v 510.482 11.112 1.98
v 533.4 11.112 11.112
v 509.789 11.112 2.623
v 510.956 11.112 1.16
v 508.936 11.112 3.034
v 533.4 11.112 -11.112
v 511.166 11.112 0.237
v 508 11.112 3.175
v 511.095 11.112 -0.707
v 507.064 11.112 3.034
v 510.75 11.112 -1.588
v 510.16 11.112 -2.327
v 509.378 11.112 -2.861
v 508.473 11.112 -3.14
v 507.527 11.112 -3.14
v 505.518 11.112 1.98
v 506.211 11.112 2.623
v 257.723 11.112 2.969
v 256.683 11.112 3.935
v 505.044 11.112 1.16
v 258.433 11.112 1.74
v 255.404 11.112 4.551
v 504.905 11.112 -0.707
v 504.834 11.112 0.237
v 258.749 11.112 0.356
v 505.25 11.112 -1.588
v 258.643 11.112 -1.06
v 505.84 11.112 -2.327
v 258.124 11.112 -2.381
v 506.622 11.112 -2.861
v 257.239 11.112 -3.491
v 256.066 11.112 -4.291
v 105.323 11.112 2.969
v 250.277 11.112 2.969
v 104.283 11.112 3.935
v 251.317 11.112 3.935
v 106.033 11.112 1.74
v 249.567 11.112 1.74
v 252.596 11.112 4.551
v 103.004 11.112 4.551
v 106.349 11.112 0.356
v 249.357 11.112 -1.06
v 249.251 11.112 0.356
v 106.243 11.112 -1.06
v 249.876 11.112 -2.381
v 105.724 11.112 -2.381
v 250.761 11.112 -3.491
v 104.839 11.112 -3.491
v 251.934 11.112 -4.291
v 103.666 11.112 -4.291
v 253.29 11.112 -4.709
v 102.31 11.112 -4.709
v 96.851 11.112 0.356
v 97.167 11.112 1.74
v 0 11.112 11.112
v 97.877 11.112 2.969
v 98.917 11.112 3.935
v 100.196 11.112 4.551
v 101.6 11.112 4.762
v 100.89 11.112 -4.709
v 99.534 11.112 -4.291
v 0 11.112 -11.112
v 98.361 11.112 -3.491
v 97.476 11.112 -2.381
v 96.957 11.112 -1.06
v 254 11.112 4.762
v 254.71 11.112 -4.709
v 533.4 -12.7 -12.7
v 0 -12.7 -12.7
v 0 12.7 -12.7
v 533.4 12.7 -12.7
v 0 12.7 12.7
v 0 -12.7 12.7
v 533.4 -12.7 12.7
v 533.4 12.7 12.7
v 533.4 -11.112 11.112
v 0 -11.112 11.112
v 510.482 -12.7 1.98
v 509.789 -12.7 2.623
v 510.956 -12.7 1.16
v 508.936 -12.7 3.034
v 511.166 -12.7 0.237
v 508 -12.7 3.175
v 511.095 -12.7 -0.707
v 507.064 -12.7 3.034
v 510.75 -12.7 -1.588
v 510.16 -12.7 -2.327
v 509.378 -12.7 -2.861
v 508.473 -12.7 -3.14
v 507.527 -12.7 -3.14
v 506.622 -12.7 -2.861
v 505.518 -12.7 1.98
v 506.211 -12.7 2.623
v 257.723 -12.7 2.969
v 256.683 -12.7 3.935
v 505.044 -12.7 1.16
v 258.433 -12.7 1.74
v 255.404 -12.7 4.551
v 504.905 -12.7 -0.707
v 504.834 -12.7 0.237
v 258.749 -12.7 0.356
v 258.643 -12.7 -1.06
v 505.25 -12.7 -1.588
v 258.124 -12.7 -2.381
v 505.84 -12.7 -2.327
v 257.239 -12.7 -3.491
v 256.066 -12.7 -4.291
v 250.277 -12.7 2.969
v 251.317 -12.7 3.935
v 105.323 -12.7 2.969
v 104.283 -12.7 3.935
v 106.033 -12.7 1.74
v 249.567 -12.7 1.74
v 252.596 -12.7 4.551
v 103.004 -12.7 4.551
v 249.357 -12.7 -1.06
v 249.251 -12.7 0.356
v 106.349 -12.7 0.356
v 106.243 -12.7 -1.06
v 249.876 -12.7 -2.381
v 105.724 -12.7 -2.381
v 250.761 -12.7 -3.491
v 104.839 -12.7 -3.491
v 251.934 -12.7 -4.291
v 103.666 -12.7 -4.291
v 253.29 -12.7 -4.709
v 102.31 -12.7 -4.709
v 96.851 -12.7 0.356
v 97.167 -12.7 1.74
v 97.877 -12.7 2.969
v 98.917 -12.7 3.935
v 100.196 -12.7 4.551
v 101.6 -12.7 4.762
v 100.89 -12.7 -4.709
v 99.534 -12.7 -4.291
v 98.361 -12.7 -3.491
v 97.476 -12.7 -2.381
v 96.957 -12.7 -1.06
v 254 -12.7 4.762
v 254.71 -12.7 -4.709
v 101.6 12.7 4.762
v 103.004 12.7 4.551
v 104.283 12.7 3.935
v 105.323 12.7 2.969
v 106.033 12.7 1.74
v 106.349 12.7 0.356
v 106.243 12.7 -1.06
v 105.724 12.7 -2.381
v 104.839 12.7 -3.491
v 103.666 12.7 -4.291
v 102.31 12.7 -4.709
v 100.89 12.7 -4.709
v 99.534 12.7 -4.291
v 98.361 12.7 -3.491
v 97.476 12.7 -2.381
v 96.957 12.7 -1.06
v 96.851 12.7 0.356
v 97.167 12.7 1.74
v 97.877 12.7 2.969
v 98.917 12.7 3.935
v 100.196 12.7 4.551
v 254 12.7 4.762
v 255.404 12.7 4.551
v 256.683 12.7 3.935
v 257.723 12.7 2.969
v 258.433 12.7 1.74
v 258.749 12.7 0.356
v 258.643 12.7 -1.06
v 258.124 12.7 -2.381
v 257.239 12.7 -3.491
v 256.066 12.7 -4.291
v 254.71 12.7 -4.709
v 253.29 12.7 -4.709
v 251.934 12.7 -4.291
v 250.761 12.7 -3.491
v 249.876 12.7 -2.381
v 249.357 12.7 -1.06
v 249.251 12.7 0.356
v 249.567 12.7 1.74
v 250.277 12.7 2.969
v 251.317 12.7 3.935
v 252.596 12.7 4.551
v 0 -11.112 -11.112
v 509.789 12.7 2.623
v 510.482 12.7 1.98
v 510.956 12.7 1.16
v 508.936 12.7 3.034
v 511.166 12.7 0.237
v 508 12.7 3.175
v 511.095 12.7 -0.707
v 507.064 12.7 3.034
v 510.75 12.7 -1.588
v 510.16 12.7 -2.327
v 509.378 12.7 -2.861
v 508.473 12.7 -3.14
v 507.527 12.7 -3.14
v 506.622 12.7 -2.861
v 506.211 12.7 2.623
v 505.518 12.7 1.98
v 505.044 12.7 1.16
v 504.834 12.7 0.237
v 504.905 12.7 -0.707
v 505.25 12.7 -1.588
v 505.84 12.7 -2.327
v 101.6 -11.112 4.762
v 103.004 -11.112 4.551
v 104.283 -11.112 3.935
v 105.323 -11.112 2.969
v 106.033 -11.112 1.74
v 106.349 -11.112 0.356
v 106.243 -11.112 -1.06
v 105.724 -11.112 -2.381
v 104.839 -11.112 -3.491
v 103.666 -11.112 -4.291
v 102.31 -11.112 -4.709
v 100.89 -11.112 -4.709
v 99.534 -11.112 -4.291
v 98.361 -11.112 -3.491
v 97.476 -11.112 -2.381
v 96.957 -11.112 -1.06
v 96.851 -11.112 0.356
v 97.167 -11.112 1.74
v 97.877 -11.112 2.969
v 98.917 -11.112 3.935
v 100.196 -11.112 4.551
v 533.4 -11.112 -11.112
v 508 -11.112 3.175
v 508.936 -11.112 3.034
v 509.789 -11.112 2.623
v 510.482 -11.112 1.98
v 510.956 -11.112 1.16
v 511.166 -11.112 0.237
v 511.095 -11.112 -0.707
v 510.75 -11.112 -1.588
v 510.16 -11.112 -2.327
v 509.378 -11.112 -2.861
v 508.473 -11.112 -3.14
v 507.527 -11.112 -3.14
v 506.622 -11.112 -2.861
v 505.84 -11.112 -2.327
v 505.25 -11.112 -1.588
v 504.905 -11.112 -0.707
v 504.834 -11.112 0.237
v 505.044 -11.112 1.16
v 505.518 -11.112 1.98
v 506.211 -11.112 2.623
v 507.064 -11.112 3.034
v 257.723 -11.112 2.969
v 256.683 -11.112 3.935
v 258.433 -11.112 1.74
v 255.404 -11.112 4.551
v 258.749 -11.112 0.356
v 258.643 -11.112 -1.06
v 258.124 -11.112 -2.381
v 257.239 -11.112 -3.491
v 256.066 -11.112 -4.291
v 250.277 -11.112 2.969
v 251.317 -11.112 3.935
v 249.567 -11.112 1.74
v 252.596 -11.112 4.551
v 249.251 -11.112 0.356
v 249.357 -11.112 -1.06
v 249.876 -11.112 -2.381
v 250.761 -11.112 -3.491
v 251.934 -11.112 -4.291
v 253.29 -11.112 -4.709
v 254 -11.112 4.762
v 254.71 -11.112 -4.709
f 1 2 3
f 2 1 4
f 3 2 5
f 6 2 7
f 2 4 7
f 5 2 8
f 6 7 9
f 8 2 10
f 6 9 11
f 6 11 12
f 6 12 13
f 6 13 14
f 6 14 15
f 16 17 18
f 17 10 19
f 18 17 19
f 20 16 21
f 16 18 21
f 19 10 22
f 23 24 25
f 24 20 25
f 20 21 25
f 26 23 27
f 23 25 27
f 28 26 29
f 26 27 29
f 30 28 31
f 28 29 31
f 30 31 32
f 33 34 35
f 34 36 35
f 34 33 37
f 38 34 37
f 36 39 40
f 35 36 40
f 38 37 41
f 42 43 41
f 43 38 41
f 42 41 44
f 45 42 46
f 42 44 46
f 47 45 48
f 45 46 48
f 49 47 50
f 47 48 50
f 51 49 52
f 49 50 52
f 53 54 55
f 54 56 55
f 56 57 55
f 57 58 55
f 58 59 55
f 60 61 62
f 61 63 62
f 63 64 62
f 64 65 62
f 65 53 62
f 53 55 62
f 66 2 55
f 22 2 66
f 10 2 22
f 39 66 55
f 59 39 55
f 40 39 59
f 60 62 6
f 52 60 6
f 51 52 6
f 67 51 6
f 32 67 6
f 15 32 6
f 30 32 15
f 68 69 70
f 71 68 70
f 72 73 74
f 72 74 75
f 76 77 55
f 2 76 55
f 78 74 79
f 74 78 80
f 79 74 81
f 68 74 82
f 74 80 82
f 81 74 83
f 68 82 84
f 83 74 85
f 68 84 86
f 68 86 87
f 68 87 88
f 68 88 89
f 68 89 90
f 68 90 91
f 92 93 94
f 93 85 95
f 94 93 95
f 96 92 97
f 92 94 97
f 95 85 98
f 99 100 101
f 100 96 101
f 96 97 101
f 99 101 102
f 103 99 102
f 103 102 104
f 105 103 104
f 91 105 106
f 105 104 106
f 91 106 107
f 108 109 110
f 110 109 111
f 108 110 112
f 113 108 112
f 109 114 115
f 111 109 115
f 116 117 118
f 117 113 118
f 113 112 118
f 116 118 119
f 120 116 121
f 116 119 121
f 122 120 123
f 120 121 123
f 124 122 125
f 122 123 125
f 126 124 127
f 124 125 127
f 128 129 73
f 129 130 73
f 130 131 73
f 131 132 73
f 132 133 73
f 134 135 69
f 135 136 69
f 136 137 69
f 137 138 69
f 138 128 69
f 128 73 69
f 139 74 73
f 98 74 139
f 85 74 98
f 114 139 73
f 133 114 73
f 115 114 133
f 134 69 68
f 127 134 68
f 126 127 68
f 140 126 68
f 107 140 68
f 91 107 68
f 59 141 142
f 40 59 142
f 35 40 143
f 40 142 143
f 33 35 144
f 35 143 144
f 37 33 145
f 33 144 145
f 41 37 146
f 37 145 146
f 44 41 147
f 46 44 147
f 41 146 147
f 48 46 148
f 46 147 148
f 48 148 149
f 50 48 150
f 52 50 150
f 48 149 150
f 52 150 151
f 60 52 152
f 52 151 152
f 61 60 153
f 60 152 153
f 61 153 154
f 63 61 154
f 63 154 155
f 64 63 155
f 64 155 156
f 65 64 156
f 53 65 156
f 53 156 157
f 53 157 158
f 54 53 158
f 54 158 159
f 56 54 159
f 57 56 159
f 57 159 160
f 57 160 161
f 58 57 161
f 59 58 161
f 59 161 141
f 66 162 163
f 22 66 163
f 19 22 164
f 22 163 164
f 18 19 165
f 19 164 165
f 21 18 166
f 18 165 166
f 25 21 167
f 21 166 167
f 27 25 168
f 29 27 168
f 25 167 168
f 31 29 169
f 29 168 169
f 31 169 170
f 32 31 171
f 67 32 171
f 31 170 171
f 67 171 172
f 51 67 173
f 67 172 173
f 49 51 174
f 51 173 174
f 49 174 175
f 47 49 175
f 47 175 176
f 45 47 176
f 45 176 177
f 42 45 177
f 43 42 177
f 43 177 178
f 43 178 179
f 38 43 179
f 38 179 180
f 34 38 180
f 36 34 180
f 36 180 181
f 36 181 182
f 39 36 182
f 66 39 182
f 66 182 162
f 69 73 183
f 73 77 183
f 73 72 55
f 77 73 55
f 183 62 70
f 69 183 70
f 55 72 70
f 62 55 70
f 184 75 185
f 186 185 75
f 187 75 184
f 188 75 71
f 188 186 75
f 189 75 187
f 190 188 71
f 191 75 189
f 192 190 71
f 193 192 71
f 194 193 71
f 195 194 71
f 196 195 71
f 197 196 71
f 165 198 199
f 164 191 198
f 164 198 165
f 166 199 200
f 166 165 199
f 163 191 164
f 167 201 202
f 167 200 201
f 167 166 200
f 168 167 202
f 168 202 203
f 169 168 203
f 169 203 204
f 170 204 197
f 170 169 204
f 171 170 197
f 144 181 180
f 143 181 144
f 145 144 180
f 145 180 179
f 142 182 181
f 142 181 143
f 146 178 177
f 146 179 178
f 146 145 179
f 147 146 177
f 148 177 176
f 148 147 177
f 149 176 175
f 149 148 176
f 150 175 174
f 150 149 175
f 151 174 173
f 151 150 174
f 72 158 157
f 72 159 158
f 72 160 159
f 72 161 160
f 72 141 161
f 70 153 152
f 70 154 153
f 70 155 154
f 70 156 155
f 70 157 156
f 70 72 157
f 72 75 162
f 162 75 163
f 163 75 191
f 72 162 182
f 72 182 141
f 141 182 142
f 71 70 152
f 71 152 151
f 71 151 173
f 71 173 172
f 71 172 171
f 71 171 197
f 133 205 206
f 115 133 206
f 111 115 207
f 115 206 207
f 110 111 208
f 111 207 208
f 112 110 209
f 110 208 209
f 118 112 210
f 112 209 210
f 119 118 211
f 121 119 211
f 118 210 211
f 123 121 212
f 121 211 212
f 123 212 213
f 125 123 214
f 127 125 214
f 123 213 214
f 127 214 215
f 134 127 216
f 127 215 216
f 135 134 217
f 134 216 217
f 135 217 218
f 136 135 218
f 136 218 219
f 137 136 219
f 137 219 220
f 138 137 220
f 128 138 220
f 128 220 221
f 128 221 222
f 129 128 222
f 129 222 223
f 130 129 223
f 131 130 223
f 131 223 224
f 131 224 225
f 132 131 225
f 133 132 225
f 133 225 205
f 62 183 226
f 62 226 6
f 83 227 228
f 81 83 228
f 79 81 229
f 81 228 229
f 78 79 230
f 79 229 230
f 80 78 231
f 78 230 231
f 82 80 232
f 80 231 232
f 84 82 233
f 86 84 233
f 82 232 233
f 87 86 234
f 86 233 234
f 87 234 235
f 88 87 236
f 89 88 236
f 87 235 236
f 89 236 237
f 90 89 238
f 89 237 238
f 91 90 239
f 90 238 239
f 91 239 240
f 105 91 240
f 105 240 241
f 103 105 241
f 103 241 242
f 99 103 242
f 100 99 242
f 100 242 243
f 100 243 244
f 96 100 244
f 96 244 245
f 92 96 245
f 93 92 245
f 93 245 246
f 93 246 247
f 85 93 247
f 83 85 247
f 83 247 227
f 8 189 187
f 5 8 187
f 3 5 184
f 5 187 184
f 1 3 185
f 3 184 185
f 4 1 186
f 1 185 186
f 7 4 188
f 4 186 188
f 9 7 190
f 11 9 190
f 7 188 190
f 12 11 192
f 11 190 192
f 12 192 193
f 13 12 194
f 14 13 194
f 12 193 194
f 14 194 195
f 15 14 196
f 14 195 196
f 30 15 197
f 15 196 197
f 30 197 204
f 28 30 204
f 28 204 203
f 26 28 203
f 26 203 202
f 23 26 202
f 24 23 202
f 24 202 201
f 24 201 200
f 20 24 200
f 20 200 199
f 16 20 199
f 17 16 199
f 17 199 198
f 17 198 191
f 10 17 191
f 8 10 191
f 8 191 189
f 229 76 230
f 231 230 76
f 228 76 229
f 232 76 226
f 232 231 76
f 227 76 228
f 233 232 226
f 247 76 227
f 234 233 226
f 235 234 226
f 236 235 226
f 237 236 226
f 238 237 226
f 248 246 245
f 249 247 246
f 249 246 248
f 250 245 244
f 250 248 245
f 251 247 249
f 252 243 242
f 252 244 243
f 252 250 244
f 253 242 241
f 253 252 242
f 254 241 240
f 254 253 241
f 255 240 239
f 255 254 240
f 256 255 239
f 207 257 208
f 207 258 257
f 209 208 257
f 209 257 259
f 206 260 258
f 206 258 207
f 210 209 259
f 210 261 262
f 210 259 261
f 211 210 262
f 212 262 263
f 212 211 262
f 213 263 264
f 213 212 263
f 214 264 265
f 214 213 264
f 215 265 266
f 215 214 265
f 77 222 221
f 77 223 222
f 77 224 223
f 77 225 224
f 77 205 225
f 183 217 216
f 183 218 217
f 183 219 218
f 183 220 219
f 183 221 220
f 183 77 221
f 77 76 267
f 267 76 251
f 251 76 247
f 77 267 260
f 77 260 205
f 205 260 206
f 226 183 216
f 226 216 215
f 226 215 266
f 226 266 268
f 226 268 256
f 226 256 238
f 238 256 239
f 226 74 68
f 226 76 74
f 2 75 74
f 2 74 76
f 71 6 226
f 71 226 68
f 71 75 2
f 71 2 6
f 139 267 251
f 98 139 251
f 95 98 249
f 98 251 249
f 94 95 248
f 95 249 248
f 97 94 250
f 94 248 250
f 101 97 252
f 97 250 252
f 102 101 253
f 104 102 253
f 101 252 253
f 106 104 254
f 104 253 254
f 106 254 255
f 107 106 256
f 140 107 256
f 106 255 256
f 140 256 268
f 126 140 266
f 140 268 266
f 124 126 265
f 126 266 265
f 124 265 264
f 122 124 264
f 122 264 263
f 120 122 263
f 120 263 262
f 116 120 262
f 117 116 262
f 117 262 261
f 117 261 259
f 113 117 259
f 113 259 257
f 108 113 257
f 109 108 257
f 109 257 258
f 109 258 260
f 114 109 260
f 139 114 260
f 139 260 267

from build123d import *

# Parameters (mm, degrees)
SKETCH1_W           = 25.4
SKETCH1_H           = 25.4
SKETCH1_W_2         = 22.225
SKETCH1_H_2         = 22.225
BOSS_EXTRUDE1_DEPTH = 533.4
SKETCH2_R           = 4.7625
CUT_EXTRUDE1_DEPTH  = 535.155417458
SKETCH3_R           = 3.175
CUT_EXTRUDE2_DEPTH  = 535.155417458


with BuildPart() as part:
    # Sketch1 → Boss-Extrude1 (new body)
    with BuildSketch(Plane(origin=(0, 0, 0), x_dir=(0, 0, -1), z_dir=(1, 0, 0))):
        Rectangle(SKETCH1_W, SKETCH1_H)
        Rectangle(SKETCH1_W_2, SKETCH1_H_2, mode=Mode.SUBTRACT)
    extrude(amount=BOSS_EXTRUDE1_DEPTH)

    # Sketch2 → Cut-Extrude1 (cut, through all)
    with BuildSketch(Plane(origin=(0, 12.7, 0), x_dir=(1, 0, 0), z_dir=(0, 1, 0))):
        with Locations(Location((101.6, 0, 0), (0, 0, 270))):
            Circle(SKETCH2_R)
        with Locations(Location((254, 0, 0), (0, 0, 270))):
            Circle(SKETCH2_R)
    extrude(amount=-CUT_EXTRUDE1_DEPTH, mode=Mode.SUBTRACT)

    # Sketch3 → Cut-Extrude2 (cut, through all)
    with BuildSketch(Plane(origin=(0, 12.7, 0), x_dir=(1, 0, 0), z_dir=(0, 1, 0))):
        with Locations(Location((508, 0, 0), (0, 0, 270))):
            Circle(SKETCH3_R)
    extrude(amount=-CUT_EXTRUDE2_DEPTH, mode=Mode.SUBTRACT)


solid = part.part
